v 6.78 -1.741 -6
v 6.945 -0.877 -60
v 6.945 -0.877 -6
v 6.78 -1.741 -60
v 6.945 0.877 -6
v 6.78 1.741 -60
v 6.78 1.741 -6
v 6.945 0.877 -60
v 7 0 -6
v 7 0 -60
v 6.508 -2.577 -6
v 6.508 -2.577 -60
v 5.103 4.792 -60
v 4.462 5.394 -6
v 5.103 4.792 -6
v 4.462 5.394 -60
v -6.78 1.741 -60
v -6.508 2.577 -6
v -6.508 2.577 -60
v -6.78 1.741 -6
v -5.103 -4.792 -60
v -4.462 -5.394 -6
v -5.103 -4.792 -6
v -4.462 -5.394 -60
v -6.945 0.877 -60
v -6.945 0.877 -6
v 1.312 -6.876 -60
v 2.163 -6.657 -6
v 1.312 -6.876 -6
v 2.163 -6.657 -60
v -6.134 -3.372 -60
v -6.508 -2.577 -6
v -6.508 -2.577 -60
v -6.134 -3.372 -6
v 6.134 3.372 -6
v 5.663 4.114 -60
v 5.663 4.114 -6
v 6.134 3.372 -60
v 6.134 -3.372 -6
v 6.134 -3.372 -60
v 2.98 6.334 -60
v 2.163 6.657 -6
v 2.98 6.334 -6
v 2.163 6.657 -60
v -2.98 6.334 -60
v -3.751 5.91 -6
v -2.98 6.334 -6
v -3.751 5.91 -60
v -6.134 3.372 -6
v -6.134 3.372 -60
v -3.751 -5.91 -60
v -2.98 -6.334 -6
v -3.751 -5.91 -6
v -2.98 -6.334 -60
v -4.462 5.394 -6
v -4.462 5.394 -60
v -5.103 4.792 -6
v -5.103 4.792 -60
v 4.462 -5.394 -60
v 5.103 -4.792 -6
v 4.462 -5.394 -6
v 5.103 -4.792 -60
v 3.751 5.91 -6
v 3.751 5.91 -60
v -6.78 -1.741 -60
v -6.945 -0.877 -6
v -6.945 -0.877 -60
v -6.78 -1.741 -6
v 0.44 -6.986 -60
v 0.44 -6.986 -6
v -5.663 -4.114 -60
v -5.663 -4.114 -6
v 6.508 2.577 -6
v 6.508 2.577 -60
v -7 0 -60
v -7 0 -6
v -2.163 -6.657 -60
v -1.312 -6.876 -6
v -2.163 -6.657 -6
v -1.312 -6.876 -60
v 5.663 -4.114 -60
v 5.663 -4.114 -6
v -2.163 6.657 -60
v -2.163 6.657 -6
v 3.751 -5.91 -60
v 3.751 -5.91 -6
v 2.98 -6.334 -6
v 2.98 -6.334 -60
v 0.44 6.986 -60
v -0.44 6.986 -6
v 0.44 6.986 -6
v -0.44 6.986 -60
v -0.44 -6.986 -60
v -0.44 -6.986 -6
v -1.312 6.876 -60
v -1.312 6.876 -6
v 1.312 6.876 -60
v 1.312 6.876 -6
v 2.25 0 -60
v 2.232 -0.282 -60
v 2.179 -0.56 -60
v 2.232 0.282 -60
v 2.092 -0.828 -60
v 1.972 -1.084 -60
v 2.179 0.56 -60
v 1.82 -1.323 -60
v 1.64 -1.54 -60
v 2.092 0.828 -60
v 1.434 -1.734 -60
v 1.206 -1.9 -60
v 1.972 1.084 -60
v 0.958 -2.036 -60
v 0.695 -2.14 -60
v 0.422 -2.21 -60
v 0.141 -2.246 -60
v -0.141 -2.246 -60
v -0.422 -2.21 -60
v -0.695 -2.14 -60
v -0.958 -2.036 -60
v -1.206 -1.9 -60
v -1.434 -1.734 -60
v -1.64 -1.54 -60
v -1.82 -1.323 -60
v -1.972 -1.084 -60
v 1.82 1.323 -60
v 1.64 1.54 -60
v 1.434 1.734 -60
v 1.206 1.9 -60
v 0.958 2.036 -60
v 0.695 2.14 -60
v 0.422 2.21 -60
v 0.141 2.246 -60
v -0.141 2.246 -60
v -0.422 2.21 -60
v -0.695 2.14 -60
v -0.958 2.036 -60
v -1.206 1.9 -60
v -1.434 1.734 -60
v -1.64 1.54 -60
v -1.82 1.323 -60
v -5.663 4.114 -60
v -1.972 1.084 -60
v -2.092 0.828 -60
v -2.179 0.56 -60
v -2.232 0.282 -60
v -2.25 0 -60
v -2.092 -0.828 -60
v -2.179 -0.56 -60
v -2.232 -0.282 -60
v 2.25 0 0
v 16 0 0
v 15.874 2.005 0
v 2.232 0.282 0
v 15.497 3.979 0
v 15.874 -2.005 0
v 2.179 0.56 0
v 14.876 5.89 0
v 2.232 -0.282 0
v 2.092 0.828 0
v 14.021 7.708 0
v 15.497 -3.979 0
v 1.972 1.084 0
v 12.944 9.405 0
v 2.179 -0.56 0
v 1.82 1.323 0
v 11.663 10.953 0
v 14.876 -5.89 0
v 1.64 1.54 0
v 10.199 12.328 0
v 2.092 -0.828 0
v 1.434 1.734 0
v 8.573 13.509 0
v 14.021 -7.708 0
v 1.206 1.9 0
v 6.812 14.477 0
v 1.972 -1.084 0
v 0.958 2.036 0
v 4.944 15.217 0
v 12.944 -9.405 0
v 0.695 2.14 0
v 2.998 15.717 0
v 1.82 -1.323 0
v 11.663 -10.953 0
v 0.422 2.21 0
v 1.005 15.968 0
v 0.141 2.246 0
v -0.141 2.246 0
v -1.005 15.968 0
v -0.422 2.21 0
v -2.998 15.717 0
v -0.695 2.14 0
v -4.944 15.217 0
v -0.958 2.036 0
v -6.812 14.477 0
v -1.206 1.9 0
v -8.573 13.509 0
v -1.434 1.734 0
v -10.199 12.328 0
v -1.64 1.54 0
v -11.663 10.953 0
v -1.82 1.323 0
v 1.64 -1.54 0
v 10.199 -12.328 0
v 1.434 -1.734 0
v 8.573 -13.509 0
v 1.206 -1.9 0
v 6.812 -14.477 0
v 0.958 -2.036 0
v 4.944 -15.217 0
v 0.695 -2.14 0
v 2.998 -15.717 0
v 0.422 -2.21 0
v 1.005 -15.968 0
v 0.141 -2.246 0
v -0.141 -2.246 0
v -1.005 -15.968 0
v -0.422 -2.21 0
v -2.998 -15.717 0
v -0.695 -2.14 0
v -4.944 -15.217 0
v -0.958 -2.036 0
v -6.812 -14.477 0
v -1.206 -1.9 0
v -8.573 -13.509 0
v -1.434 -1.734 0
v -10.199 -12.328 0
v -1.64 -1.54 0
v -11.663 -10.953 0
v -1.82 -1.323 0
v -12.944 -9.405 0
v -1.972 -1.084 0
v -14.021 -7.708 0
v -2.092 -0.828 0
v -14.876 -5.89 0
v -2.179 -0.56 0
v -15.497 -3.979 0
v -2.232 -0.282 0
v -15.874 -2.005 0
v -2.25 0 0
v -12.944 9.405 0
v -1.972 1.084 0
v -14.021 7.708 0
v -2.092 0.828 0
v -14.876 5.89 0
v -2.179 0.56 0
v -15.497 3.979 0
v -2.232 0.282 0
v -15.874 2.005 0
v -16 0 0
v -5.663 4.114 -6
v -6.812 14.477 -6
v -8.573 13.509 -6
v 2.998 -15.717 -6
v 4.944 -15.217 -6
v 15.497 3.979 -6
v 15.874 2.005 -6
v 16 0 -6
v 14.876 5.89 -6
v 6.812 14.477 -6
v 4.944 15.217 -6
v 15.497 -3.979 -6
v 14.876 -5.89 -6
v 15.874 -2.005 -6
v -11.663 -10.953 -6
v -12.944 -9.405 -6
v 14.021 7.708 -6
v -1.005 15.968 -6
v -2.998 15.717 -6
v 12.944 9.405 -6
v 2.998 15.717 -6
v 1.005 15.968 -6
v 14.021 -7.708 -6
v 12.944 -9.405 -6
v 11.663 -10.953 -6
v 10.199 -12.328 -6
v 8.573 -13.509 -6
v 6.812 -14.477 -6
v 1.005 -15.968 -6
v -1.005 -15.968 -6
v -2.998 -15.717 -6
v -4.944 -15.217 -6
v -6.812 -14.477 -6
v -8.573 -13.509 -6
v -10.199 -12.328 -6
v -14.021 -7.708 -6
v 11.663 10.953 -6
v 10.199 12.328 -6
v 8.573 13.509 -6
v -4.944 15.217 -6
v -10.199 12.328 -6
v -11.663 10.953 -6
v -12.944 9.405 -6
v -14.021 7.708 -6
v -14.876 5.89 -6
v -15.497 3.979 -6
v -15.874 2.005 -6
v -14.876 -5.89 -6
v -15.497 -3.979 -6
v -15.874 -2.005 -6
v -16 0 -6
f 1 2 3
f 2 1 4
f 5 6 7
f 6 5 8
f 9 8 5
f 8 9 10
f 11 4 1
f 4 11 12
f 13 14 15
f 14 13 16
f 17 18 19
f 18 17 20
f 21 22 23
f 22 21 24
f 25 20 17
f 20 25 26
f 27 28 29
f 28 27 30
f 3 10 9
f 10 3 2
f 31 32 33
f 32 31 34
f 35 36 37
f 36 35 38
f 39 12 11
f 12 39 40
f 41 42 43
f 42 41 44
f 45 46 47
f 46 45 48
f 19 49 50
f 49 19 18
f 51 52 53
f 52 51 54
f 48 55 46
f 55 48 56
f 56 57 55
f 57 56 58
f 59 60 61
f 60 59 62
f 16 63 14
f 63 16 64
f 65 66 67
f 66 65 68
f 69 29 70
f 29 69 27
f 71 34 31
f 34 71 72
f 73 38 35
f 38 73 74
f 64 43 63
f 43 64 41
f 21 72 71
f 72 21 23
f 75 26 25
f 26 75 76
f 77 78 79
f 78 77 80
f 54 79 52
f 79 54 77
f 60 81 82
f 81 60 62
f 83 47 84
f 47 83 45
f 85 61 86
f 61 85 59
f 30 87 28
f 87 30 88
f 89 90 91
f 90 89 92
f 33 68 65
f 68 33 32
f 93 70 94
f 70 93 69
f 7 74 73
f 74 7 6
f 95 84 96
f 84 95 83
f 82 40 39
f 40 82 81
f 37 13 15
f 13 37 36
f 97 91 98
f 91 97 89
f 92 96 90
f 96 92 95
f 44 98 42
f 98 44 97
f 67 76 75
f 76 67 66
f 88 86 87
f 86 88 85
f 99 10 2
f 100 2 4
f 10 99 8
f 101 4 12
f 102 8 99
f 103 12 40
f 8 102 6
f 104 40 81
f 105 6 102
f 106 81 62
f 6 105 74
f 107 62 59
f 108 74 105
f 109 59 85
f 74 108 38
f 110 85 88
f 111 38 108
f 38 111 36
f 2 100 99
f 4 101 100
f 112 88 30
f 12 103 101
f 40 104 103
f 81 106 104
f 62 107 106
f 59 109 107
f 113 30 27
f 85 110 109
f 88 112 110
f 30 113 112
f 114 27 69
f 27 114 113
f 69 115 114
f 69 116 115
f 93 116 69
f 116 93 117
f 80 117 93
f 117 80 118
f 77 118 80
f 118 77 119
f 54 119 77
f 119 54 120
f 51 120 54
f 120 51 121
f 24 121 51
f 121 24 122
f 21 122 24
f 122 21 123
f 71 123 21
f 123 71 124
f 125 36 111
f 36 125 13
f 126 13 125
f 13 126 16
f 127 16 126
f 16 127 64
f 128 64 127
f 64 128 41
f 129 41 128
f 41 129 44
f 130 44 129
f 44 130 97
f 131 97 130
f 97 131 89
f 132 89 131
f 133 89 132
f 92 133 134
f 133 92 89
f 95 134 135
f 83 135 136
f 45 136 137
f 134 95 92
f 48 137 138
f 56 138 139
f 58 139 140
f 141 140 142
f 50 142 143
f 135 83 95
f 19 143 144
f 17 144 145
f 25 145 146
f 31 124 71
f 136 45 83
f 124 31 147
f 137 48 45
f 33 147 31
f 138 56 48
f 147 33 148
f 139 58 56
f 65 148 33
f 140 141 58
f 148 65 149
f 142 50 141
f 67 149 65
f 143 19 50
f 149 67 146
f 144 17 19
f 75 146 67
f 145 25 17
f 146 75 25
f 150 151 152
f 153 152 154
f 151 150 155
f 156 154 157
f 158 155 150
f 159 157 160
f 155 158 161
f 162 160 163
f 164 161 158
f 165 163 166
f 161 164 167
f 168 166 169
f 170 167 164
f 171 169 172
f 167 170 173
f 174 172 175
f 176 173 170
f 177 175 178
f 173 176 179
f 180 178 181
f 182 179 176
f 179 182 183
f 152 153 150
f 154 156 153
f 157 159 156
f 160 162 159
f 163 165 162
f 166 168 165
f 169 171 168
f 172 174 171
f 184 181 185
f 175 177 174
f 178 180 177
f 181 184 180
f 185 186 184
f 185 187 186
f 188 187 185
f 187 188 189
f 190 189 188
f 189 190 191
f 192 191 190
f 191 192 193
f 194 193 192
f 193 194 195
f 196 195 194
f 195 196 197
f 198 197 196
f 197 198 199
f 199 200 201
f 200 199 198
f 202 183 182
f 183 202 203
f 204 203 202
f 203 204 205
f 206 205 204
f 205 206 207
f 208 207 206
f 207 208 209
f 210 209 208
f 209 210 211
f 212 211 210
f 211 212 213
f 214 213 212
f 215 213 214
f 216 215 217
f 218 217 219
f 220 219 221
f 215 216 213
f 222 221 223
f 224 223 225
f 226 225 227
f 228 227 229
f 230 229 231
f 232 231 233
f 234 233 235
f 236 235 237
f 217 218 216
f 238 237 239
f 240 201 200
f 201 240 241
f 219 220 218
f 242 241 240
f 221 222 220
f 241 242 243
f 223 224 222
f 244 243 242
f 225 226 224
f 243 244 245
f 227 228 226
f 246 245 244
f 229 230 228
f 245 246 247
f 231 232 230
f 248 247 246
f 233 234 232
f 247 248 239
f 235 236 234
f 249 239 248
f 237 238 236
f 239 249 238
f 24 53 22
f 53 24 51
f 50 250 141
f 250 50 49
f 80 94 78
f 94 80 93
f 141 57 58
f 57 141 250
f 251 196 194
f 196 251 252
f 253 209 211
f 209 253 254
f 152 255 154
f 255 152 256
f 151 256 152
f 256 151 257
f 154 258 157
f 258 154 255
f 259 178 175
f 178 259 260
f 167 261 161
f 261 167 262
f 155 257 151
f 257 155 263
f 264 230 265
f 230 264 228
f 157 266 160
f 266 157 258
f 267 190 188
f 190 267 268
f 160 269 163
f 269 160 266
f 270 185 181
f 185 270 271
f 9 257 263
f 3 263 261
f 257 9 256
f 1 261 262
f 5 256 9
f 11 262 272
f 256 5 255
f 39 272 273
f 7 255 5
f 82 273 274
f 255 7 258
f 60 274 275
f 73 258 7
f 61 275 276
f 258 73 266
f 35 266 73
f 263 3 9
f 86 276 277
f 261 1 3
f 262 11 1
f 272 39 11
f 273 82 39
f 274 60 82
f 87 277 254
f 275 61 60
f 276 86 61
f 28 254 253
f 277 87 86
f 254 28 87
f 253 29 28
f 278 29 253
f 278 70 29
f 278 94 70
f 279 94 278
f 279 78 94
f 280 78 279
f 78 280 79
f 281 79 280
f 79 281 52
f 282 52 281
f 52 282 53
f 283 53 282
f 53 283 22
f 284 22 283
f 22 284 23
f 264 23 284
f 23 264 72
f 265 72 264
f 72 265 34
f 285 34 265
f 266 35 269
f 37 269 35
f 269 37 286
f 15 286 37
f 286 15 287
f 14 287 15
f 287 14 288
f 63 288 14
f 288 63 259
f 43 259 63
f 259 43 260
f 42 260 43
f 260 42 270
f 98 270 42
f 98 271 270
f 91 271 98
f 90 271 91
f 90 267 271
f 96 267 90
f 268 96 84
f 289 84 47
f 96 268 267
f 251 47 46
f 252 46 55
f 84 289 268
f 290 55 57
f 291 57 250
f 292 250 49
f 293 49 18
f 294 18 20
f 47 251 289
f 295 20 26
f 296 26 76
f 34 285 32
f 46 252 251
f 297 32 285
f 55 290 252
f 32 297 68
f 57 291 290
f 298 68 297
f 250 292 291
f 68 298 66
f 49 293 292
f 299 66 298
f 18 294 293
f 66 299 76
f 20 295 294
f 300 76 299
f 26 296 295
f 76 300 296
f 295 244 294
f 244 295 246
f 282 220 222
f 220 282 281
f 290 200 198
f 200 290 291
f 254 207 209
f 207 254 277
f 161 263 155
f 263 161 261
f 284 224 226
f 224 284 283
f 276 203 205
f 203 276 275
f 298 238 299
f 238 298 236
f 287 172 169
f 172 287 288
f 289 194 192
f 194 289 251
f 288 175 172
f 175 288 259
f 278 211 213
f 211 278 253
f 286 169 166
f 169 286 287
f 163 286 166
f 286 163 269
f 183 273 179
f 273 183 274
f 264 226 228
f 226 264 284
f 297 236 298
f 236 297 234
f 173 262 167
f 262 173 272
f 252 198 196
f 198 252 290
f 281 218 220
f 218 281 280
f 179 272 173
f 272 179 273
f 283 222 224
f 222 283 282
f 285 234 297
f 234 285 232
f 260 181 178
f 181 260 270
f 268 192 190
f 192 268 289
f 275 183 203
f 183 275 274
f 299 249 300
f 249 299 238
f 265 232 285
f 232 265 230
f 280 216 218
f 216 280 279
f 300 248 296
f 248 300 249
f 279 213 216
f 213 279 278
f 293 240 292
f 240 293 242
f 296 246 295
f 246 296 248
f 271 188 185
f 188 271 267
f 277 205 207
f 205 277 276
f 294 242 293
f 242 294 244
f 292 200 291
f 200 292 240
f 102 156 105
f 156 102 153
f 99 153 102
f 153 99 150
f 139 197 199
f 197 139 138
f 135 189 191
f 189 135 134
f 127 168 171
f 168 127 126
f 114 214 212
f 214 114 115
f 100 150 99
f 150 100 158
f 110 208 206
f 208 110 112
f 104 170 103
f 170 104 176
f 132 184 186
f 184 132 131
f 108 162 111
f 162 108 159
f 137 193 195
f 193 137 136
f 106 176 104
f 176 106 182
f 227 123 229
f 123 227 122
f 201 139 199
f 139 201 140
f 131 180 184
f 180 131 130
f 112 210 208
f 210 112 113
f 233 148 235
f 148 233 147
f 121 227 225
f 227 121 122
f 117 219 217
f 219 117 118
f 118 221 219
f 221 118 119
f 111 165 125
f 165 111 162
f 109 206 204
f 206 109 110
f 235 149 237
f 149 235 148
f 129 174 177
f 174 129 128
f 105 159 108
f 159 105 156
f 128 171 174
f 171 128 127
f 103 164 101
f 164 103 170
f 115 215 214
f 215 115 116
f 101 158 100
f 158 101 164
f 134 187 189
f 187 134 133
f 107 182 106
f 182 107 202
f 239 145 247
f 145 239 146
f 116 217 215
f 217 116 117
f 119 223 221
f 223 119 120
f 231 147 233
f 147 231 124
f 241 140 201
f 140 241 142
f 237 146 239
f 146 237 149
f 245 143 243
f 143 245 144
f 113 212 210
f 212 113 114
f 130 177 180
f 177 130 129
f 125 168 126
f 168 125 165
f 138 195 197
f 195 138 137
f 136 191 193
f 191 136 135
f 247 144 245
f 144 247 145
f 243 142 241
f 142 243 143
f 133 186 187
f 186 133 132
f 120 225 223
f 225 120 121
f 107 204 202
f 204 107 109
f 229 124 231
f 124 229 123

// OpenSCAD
$fn = 50;


difference() {
	union() {
		translate(v = [0, 0, -60.0000000000]) {
			cylinder(h = 60, r = 7.0000000000);
		}
		translate(v = [0, 0, -6.0000000000]) {
			cylinder(h = 6, r = 16.0000000000);
		}
	}
	union() {
		#translate(v = [0, 0, -60]) {
			cylinder(h = 60, r = 2.2500000000);
		}
	}
}
